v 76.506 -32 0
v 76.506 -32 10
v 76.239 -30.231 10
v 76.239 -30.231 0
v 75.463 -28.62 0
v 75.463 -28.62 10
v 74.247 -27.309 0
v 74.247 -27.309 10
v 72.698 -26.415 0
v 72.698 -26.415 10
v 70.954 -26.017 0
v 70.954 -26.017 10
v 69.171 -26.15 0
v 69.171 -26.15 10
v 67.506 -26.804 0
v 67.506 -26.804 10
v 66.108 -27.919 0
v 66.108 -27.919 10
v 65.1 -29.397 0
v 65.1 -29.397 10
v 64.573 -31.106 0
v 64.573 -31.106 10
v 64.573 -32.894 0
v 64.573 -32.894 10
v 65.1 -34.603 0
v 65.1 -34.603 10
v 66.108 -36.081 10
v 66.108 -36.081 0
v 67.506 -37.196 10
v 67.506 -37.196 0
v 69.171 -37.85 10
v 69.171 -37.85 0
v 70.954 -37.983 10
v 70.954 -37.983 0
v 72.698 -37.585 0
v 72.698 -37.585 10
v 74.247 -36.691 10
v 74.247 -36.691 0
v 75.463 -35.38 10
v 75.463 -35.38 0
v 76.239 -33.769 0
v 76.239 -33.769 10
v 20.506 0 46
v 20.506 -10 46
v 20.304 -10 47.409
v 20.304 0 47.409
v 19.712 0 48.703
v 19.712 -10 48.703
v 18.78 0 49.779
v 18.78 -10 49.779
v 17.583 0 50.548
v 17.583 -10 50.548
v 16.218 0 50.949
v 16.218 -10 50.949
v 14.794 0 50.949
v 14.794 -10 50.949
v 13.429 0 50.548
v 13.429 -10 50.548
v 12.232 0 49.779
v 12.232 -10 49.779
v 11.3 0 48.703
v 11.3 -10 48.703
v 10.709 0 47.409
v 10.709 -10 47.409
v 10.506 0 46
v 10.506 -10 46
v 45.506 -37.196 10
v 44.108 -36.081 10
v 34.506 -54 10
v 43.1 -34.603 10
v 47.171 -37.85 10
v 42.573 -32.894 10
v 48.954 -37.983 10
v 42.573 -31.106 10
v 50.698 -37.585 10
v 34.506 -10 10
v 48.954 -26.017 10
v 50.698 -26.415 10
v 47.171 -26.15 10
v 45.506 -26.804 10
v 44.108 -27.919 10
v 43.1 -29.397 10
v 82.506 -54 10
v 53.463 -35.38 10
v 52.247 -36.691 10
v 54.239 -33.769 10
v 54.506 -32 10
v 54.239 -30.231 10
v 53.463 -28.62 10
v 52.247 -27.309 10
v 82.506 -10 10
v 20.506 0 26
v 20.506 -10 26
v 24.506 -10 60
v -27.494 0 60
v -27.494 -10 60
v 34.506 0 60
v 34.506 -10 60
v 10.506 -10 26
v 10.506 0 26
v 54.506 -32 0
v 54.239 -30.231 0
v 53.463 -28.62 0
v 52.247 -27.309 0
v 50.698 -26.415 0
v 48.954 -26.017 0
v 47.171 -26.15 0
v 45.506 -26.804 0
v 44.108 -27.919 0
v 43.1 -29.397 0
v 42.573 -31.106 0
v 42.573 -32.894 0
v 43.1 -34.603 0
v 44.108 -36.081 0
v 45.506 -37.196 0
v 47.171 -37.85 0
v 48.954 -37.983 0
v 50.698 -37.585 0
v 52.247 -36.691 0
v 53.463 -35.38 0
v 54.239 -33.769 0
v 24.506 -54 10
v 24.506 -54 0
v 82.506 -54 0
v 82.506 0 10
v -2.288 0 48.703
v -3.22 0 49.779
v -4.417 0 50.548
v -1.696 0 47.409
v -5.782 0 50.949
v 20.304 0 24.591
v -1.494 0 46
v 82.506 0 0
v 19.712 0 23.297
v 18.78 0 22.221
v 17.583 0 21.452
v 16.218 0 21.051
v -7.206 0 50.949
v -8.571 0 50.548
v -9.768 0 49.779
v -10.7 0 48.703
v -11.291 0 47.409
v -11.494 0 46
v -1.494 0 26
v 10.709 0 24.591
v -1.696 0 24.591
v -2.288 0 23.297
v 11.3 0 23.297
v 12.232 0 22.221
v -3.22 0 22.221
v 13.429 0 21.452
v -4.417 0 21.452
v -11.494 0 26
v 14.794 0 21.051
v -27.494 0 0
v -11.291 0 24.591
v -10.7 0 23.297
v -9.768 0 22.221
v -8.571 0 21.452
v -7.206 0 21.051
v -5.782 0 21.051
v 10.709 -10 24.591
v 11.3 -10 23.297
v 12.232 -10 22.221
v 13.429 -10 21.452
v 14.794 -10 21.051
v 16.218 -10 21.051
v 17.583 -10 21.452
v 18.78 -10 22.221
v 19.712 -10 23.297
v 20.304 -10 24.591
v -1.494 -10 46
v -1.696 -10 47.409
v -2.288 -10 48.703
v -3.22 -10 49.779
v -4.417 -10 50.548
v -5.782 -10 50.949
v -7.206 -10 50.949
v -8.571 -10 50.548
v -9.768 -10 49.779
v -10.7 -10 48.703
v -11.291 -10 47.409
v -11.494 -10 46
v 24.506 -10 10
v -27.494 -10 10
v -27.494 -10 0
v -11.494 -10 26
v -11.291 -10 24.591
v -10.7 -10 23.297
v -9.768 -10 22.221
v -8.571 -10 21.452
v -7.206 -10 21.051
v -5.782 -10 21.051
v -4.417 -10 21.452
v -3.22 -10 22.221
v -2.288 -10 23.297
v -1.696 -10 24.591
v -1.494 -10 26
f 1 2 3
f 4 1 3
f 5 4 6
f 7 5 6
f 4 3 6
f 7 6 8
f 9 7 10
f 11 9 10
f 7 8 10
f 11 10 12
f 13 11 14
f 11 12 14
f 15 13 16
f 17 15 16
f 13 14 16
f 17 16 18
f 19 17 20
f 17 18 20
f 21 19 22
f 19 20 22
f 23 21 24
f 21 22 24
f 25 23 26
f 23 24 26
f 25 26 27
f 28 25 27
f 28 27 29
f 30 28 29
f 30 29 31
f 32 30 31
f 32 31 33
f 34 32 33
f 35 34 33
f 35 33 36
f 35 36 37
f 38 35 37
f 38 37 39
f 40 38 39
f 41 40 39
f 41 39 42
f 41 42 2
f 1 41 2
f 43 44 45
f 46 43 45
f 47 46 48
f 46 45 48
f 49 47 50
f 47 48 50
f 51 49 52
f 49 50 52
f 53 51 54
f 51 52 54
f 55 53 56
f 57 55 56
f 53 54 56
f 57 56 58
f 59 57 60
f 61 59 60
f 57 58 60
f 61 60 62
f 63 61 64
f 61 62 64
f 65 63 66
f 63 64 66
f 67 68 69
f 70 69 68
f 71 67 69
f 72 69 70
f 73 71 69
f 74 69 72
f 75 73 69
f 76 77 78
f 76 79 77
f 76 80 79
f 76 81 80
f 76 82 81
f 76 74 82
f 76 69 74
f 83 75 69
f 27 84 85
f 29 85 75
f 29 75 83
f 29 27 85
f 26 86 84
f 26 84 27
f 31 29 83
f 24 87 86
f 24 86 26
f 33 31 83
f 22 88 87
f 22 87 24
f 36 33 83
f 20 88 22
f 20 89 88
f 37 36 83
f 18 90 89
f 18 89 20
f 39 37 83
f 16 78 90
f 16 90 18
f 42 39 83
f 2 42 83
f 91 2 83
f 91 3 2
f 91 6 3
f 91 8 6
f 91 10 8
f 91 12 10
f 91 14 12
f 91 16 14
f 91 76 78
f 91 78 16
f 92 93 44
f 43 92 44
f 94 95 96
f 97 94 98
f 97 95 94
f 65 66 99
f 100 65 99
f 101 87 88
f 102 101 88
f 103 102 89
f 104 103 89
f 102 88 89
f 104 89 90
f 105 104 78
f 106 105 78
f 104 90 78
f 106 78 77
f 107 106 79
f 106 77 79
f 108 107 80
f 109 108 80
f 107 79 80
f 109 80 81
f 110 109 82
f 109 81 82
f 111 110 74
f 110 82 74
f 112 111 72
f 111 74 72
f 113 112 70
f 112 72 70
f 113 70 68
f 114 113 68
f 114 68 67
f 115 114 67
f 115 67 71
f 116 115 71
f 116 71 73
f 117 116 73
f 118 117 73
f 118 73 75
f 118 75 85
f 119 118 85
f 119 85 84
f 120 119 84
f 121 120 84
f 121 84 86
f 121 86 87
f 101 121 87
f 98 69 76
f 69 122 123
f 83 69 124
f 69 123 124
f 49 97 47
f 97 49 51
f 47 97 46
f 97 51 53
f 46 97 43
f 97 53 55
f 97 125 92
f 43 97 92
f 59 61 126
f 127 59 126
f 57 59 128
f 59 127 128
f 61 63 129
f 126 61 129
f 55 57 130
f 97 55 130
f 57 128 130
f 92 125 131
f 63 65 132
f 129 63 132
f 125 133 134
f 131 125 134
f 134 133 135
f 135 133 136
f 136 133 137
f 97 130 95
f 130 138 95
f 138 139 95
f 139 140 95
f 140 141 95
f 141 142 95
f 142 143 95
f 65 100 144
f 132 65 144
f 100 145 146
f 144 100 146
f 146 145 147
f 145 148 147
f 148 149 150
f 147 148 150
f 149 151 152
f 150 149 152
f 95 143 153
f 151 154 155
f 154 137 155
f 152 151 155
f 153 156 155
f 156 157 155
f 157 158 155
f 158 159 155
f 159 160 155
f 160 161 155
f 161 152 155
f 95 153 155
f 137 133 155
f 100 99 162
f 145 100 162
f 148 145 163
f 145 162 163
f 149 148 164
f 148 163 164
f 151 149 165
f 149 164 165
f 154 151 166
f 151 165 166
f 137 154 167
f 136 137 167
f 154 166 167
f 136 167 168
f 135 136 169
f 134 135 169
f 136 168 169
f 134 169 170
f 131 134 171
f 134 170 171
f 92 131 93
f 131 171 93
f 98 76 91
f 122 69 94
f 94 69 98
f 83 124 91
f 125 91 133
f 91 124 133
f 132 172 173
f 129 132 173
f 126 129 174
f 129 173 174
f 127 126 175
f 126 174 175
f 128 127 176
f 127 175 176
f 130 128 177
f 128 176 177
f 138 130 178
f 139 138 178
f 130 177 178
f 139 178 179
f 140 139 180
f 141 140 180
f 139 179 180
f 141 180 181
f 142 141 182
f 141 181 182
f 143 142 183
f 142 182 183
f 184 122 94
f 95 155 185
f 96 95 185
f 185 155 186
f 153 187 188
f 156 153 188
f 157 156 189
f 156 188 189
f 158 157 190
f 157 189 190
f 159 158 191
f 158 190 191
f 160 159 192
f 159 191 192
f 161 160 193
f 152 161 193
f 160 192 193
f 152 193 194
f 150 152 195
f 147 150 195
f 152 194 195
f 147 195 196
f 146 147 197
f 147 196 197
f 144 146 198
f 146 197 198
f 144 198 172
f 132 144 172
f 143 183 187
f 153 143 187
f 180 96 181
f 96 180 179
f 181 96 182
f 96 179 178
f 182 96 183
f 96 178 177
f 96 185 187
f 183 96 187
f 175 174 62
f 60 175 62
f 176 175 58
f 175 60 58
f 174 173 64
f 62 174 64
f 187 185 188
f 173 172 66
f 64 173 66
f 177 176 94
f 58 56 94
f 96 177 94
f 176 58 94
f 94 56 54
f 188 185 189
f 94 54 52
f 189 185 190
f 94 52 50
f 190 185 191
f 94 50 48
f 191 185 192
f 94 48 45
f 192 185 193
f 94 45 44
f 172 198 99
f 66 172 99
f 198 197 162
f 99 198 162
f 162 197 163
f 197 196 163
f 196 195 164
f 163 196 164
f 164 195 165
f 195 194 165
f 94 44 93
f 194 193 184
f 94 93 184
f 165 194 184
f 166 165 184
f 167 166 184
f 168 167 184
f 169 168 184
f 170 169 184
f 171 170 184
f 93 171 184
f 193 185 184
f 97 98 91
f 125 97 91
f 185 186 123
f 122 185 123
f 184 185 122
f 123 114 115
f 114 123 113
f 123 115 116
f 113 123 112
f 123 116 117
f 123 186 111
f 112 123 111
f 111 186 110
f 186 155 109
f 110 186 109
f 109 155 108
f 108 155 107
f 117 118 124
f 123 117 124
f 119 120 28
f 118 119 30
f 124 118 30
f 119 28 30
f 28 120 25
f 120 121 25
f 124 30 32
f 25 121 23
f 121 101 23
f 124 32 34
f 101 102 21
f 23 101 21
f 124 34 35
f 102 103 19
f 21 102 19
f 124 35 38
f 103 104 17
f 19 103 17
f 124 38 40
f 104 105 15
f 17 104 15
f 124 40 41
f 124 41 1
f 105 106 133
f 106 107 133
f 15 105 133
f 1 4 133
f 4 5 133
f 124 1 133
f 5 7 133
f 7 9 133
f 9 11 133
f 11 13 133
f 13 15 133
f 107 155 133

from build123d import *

# Parameters (mm, degrees)
F0_W      = 10
F0_H      = 44
F1_DEPTH  = 60
F0_W_2    = 48
F2_DEPTH  = 10
F4_DEPTH  = 25
F6_DEPTH  = 25
F7_R      = 6
F8_DEPTH  = 10.001
F10_DEPTH = 10.001


with BuildPart() as f1:
    # F0 (on Top) → F1 (new body)
    with BuildSketch(Plane.XY):
        Polygon((82.506062, 0), (-27.493938, 0), (-27.493938, -10), (24.506062, -10), (34.506062, -10), (82.506062, -10), align=None)
        with Locations((29.506062, -32)):
            Rectangle(F0_W, F0_H)
    extrude(amount=F1_DEPTH)

    # F0 (on Top) → F2 (join)
    with BuildSketch(Plane.XY):
        Polygon((24.506062, -10), (-27.493938, -10), (24.506062, -54), align=None)
        with Locations((58.506062, -32)):
            Rectangle(F0_W_2, F0_H)
    extrude(amount=F2_DEPTH)

    # F3 (on face) → F4 (cut)
    with BuildSketch(Plane.YZ.offset(34.506062)):
        Polygon((-54, 60), (-54, 10), (-10, 60), align=None)
    extrude(amount=-F4_DEPTH, mode=Mode.SUBTRACT)

    # F5 (on face) → F6 (cut)
    with BuildSketch(Plane.XZ.offset(10)):
        Polygon((82.506062, 60), (34.506062, 60), (82.506062, 10), align=None)
    extrude(amount=-F6_DEPTH, mode=Mode.SUBTRACT)

    # F7 (on face) → F8 (cut, through all)
    with BuildSketch(Plane.XY.offset(10)):
        with Locations((48.506062, -32)):
            Circle(F7_R)
        with Locations((70.506062, -32)):
            Circle(F7_R)
    extrude(amount=-F8_DEPTH, mode=Mode.SUBTRACT)

    # F9 (on face) → F10 (cut, through all)
    with BuildSketch(Plane.XZ.offset(10)):
        with BuildLine():
            ThreePointArc((-1.493938, 46), (-6.493938, 51), (-11.493938, 46))
            Line((-11.493938, 46), (-11.493938, 26))
            ThreePointArc((-11.493938, 26), (-6.493938, 21), (-1.493938, 26))
            Line((-1.493938, 26), (-1.493938, 46))
        make_face()
        with BuildLine():
            ThreePointArc((20.506062, 46), (15.506062, 51), (10.506062, 46))
            Line((10.506062, 46), (10.506062, 26))
            ThreePointArc((10.506062, 26), (15.506062, 21), (20.506062, 26))
            Line((20.506062, 26), (20.506062, 46))
        make_face()
    extrude(amount=-F10_DEPTH, mode=Mode.SUBTRACT)


solid = f1.part
